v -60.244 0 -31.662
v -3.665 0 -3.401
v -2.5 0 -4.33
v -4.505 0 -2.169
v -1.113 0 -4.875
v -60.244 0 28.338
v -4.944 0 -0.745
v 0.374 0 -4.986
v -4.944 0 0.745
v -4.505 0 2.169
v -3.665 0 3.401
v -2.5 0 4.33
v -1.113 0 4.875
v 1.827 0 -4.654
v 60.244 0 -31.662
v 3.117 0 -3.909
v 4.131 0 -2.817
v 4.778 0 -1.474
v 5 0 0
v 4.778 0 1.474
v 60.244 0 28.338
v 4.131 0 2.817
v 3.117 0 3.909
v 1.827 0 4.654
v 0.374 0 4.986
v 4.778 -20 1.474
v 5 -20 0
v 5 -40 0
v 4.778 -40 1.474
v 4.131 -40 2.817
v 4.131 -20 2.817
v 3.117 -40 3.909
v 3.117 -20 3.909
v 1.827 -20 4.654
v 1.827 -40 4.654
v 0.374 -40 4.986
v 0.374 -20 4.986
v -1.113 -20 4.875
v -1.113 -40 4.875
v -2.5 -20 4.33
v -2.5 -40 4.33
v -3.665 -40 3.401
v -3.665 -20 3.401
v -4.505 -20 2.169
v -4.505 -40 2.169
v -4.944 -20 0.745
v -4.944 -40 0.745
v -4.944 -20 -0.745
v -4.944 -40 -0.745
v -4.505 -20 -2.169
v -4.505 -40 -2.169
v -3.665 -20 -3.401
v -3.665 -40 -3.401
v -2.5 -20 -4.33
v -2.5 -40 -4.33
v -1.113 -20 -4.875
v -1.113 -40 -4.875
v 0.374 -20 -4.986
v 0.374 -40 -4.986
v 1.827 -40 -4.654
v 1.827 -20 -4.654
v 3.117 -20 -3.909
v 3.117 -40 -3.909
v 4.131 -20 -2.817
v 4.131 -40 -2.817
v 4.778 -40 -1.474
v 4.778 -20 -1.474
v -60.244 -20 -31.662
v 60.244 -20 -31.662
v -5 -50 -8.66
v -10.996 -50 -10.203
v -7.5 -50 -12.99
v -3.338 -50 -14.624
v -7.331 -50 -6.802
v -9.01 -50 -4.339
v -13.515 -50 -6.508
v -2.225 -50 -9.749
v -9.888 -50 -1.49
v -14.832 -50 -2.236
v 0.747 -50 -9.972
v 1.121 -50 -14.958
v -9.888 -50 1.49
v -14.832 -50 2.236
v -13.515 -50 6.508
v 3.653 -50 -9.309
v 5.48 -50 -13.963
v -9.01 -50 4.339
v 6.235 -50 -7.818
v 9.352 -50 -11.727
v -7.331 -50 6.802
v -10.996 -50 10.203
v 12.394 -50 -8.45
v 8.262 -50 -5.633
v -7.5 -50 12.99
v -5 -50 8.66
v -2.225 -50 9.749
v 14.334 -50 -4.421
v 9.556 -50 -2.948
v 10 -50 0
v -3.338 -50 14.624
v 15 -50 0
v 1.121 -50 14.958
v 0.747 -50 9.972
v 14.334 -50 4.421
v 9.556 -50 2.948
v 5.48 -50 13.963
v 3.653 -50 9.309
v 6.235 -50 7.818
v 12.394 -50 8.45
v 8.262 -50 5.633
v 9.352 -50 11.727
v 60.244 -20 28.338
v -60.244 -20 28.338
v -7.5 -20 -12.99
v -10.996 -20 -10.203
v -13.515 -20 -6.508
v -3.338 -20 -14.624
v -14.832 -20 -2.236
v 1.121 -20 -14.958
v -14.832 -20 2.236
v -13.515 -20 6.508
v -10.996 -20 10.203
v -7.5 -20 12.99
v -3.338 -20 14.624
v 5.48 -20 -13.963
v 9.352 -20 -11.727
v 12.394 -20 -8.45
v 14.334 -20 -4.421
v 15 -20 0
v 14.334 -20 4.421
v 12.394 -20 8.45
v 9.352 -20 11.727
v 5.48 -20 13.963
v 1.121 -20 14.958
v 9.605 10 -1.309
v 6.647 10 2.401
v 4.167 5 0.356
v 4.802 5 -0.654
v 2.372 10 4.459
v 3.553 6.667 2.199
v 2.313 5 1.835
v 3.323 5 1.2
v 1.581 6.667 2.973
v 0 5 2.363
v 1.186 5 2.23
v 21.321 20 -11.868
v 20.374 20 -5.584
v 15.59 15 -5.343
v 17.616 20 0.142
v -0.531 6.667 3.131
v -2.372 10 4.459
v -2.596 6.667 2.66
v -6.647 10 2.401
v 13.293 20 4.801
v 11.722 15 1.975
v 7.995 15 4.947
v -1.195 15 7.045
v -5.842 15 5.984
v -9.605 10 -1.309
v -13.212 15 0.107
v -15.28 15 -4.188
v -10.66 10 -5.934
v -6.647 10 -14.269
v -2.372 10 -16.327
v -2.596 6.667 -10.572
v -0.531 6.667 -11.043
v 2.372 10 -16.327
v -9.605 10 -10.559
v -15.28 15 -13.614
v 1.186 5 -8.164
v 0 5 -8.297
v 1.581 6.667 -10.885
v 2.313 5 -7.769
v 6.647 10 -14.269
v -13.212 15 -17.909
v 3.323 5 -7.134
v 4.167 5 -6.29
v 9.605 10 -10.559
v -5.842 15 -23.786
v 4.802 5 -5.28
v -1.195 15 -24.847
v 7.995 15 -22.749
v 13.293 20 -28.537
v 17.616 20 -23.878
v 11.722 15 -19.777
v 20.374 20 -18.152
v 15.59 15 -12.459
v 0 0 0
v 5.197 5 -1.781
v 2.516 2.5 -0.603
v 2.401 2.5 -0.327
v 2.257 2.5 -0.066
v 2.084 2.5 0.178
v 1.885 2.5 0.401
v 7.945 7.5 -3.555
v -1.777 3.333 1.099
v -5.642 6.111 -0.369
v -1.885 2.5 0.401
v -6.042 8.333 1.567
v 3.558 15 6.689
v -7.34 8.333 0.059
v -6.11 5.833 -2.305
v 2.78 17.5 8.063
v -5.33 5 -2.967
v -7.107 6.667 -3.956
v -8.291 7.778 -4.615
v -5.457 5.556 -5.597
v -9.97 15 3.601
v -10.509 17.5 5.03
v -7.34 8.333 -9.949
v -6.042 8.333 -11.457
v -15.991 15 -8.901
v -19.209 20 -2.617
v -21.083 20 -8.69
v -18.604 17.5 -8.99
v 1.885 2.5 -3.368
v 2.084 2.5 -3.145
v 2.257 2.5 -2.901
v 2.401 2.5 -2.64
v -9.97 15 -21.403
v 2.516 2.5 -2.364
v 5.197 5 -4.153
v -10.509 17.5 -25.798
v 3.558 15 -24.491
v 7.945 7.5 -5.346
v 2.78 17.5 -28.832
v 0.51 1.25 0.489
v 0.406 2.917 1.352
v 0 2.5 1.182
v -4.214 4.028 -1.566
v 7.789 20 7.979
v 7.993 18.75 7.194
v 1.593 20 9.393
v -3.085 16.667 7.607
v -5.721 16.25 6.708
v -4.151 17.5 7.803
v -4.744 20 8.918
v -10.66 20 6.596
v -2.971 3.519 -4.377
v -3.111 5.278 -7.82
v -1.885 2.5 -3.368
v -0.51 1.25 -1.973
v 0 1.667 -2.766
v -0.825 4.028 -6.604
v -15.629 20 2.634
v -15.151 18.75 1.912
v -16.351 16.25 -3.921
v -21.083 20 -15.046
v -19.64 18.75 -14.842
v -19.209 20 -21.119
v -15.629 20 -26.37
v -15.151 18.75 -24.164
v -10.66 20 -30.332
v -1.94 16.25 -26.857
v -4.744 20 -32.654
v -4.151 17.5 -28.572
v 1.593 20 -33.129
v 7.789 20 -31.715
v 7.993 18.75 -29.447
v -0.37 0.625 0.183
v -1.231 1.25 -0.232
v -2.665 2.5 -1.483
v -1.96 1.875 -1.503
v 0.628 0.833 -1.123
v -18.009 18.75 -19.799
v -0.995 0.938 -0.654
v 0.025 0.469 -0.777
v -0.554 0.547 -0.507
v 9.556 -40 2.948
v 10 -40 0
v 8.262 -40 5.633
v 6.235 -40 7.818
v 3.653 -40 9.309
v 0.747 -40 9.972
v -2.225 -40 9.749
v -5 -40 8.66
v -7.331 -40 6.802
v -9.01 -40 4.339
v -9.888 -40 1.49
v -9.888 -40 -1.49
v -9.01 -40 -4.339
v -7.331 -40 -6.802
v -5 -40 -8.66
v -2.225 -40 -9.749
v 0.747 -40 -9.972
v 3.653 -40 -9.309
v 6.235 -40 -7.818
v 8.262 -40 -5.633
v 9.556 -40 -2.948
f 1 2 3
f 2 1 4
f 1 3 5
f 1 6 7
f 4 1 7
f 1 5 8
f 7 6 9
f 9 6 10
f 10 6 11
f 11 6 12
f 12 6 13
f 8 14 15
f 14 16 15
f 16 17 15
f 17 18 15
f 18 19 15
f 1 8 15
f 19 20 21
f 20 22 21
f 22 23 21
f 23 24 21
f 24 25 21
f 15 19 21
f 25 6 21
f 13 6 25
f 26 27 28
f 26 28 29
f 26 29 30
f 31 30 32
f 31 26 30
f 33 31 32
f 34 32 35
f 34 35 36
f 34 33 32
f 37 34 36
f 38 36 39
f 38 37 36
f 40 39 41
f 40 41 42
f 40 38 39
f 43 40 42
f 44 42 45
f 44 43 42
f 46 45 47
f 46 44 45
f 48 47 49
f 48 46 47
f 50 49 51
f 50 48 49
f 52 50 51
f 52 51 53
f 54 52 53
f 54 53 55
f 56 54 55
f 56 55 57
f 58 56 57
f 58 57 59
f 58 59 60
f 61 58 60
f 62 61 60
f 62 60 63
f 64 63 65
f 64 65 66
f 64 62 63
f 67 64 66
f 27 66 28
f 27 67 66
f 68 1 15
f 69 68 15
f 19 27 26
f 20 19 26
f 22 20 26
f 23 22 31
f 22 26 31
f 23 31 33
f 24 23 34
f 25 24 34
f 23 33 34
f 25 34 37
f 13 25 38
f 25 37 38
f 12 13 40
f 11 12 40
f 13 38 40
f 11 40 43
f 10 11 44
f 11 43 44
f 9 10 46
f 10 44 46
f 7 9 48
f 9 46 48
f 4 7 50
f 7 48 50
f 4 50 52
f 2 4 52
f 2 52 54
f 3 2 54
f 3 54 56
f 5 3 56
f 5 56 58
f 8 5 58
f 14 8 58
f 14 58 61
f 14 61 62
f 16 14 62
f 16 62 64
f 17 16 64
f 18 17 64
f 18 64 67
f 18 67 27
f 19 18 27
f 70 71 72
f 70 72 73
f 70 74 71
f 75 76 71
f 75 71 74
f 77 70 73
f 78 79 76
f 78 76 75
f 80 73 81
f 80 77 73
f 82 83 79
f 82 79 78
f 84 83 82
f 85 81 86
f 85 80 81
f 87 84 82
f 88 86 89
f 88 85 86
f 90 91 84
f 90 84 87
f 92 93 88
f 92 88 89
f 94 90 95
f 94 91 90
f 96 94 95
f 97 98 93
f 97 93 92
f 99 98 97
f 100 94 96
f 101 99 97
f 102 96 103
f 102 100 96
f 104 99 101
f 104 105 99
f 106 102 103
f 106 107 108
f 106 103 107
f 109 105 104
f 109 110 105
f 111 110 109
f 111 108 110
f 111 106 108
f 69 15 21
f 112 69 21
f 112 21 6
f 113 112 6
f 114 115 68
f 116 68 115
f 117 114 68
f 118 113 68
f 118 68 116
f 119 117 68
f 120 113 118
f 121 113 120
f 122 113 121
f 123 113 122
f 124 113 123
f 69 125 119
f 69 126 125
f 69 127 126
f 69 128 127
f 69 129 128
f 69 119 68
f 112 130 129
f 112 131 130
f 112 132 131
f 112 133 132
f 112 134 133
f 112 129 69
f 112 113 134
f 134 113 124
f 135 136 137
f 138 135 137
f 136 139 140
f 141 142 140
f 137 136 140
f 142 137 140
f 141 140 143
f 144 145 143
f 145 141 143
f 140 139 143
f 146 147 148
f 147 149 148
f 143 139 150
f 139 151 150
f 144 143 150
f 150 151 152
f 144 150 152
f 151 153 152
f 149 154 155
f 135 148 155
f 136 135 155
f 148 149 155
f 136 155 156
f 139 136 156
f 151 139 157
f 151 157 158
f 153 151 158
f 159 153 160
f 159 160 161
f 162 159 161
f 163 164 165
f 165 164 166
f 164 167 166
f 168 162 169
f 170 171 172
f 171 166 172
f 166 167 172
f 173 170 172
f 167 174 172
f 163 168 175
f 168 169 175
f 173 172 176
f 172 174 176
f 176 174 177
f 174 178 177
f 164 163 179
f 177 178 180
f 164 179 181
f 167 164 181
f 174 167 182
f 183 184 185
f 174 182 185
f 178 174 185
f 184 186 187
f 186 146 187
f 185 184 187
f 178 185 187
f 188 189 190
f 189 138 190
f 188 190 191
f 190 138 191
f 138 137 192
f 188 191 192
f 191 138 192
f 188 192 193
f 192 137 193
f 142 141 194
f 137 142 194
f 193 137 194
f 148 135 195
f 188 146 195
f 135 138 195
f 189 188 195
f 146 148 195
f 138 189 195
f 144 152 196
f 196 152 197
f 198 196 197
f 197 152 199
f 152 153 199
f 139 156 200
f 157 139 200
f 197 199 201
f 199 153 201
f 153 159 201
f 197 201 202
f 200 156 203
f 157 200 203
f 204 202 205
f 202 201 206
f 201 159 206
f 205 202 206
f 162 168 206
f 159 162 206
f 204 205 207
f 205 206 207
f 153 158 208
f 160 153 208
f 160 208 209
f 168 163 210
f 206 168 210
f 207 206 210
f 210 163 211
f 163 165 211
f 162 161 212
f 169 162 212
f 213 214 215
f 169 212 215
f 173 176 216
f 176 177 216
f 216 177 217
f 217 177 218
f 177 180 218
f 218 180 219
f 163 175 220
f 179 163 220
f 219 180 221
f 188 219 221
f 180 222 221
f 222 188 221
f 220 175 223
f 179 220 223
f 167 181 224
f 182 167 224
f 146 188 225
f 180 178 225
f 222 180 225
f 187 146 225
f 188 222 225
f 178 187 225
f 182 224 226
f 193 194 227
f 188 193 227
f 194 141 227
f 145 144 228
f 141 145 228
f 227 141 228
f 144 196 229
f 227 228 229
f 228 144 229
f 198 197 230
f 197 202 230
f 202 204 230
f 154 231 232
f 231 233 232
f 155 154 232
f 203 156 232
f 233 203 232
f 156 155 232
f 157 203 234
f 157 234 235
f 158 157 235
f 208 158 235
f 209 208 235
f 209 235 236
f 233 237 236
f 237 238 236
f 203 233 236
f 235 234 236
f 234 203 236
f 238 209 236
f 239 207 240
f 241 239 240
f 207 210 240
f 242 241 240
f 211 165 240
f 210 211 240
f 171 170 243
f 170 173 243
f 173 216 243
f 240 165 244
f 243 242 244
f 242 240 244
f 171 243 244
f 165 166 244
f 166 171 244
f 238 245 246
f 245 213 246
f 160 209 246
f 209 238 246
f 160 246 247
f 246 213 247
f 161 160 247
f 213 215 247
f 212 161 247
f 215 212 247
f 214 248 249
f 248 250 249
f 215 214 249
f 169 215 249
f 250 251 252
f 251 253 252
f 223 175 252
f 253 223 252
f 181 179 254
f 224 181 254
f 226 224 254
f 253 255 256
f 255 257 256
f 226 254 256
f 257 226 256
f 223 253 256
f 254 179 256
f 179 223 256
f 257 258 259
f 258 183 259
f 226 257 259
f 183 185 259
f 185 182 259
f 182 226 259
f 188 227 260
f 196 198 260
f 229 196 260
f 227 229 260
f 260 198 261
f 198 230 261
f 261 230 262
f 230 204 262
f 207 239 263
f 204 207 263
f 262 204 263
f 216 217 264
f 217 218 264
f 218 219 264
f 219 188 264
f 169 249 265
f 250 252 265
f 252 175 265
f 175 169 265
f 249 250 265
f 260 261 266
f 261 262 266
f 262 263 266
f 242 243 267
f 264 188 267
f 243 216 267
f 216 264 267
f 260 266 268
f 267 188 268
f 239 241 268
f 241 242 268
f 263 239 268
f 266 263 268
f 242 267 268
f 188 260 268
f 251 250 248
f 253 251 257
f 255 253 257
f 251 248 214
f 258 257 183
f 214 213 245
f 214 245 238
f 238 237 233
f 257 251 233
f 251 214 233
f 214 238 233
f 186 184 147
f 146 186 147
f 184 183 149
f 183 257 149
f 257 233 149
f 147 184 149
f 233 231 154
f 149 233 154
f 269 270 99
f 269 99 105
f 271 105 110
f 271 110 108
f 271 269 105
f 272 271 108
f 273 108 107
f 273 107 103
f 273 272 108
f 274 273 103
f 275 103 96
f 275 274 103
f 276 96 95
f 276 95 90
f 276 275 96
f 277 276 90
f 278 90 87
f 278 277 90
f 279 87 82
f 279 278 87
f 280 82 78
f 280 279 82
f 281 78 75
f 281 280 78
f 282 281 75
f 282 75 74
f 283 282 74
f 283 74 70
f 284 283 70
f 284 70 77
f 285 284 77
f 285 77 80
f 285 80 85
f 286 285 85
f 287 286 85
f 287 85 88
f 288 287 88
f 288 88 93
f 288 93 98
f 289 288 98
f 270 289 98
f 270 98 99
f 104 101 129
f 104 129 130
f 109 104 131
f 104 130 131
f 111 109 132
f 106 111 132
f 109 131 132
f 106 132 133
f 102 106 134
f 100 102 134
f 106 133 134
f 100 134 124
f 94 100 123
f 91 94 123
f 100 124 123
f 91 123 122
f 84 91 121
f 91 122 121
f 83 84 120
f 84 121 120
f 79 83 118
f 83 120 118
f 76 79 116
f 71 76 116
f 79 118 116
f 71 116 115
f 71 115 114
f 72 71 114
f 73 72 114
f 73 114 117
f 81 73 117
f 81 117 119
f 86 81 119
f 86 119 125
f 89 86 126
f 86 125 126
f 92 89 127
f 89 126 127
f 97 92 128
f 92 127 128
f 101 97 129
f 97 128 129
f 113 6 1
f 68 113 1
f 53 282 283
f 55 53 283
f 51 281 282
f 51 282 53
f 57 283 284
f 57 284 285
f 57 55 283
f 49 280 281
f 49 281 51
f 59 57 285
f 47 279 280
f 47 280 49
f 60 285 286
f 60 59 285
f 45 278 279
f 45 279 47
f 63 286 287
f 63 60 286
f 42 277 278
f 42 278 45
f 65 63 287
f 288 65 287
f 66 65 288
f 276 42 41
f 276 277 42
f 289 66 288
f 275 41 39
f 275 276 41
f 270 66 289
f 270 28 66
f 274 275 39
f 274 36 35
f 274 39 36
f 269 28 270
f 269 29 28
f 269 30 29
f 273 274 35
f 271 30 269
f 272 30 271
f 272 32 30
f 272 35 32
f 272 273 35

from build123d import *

# Parameters (mm, degrees)
F1_DEPTH = 20
F2_R     = 5
F3_DEPTH = 20.001
F4_R     = 10
F4_R_2   = 5
F5_DEPTH = 20
F6_R     = 15
F6_R_2   = 10
F8_DEPTH = 30
F10_R    = 21.3207738462


with BuildPart() as f1:
    # F0 (on Front) → F1 (new body)
    with BuildSketch(Plane.XZ):
        Polygon((45.2439381182, 28.3381881281), (0, 28.3381881281), (0, -31.6618118719), (45.2439381182, -31.6618118719), (50.2439381182, -31.6618118719), (55.2439381182, -31.6618118719), (60.2439381182, -31.6618118719), (60.2439381182, 28.3381881281), align=None)
        Polygon((0, -31.6618118719), (0, 28.3381881281), (-45.2439381182, 28.3381881281), (-60.2439381182, 28.3381881281), (-60.2439381182, -31.6618118719), (-55.2439381182, -31.6618118719), (-50.2439381182, -31.6618118719), (-45.2439381182, -31.6618118719), align=None)
    extrude(amount=F1_DEPTH)

    # F2 (on face) → F3 (cut, through all)
    with BuildSketch(Plane.XZ.offset(20)):
        Circle(F2_R)
    extrude(amount=-F3_DEPTH, mode=Mode.SUBTRACT)

    # F4 (on face) → F5 (join)
    with BuildSketch(Plane.XZ.offset(20)):
        Circle(F4_R)
        Circle(F4_R_2, mode=Mode.SUBTRACT)
    extrude(amount=F5_DEPTH)

    # F6 (on face) → F8 (join)
    with BuildSketch(Plane.XZ.offset(20)):
        Circle(F6_R)
        Circle(F6_R_2, mode=Mode.SUBTRACT)
    extrude(amount=F8_DEPTH)


with BuildPart() as f11:
    # F10 (on offset) → F11 section 0
    with BuildSketch(Plane.XZ.offset(-20), mode=Mode.PRIVATE) as f11_s0:
        with Locations((0, -11.8679488078)):
            Circle(F10_R)
    loft([Vertex(0, 0, 0), f11_s0.sketch])


solid = Compound([f1.part, f11.part])
